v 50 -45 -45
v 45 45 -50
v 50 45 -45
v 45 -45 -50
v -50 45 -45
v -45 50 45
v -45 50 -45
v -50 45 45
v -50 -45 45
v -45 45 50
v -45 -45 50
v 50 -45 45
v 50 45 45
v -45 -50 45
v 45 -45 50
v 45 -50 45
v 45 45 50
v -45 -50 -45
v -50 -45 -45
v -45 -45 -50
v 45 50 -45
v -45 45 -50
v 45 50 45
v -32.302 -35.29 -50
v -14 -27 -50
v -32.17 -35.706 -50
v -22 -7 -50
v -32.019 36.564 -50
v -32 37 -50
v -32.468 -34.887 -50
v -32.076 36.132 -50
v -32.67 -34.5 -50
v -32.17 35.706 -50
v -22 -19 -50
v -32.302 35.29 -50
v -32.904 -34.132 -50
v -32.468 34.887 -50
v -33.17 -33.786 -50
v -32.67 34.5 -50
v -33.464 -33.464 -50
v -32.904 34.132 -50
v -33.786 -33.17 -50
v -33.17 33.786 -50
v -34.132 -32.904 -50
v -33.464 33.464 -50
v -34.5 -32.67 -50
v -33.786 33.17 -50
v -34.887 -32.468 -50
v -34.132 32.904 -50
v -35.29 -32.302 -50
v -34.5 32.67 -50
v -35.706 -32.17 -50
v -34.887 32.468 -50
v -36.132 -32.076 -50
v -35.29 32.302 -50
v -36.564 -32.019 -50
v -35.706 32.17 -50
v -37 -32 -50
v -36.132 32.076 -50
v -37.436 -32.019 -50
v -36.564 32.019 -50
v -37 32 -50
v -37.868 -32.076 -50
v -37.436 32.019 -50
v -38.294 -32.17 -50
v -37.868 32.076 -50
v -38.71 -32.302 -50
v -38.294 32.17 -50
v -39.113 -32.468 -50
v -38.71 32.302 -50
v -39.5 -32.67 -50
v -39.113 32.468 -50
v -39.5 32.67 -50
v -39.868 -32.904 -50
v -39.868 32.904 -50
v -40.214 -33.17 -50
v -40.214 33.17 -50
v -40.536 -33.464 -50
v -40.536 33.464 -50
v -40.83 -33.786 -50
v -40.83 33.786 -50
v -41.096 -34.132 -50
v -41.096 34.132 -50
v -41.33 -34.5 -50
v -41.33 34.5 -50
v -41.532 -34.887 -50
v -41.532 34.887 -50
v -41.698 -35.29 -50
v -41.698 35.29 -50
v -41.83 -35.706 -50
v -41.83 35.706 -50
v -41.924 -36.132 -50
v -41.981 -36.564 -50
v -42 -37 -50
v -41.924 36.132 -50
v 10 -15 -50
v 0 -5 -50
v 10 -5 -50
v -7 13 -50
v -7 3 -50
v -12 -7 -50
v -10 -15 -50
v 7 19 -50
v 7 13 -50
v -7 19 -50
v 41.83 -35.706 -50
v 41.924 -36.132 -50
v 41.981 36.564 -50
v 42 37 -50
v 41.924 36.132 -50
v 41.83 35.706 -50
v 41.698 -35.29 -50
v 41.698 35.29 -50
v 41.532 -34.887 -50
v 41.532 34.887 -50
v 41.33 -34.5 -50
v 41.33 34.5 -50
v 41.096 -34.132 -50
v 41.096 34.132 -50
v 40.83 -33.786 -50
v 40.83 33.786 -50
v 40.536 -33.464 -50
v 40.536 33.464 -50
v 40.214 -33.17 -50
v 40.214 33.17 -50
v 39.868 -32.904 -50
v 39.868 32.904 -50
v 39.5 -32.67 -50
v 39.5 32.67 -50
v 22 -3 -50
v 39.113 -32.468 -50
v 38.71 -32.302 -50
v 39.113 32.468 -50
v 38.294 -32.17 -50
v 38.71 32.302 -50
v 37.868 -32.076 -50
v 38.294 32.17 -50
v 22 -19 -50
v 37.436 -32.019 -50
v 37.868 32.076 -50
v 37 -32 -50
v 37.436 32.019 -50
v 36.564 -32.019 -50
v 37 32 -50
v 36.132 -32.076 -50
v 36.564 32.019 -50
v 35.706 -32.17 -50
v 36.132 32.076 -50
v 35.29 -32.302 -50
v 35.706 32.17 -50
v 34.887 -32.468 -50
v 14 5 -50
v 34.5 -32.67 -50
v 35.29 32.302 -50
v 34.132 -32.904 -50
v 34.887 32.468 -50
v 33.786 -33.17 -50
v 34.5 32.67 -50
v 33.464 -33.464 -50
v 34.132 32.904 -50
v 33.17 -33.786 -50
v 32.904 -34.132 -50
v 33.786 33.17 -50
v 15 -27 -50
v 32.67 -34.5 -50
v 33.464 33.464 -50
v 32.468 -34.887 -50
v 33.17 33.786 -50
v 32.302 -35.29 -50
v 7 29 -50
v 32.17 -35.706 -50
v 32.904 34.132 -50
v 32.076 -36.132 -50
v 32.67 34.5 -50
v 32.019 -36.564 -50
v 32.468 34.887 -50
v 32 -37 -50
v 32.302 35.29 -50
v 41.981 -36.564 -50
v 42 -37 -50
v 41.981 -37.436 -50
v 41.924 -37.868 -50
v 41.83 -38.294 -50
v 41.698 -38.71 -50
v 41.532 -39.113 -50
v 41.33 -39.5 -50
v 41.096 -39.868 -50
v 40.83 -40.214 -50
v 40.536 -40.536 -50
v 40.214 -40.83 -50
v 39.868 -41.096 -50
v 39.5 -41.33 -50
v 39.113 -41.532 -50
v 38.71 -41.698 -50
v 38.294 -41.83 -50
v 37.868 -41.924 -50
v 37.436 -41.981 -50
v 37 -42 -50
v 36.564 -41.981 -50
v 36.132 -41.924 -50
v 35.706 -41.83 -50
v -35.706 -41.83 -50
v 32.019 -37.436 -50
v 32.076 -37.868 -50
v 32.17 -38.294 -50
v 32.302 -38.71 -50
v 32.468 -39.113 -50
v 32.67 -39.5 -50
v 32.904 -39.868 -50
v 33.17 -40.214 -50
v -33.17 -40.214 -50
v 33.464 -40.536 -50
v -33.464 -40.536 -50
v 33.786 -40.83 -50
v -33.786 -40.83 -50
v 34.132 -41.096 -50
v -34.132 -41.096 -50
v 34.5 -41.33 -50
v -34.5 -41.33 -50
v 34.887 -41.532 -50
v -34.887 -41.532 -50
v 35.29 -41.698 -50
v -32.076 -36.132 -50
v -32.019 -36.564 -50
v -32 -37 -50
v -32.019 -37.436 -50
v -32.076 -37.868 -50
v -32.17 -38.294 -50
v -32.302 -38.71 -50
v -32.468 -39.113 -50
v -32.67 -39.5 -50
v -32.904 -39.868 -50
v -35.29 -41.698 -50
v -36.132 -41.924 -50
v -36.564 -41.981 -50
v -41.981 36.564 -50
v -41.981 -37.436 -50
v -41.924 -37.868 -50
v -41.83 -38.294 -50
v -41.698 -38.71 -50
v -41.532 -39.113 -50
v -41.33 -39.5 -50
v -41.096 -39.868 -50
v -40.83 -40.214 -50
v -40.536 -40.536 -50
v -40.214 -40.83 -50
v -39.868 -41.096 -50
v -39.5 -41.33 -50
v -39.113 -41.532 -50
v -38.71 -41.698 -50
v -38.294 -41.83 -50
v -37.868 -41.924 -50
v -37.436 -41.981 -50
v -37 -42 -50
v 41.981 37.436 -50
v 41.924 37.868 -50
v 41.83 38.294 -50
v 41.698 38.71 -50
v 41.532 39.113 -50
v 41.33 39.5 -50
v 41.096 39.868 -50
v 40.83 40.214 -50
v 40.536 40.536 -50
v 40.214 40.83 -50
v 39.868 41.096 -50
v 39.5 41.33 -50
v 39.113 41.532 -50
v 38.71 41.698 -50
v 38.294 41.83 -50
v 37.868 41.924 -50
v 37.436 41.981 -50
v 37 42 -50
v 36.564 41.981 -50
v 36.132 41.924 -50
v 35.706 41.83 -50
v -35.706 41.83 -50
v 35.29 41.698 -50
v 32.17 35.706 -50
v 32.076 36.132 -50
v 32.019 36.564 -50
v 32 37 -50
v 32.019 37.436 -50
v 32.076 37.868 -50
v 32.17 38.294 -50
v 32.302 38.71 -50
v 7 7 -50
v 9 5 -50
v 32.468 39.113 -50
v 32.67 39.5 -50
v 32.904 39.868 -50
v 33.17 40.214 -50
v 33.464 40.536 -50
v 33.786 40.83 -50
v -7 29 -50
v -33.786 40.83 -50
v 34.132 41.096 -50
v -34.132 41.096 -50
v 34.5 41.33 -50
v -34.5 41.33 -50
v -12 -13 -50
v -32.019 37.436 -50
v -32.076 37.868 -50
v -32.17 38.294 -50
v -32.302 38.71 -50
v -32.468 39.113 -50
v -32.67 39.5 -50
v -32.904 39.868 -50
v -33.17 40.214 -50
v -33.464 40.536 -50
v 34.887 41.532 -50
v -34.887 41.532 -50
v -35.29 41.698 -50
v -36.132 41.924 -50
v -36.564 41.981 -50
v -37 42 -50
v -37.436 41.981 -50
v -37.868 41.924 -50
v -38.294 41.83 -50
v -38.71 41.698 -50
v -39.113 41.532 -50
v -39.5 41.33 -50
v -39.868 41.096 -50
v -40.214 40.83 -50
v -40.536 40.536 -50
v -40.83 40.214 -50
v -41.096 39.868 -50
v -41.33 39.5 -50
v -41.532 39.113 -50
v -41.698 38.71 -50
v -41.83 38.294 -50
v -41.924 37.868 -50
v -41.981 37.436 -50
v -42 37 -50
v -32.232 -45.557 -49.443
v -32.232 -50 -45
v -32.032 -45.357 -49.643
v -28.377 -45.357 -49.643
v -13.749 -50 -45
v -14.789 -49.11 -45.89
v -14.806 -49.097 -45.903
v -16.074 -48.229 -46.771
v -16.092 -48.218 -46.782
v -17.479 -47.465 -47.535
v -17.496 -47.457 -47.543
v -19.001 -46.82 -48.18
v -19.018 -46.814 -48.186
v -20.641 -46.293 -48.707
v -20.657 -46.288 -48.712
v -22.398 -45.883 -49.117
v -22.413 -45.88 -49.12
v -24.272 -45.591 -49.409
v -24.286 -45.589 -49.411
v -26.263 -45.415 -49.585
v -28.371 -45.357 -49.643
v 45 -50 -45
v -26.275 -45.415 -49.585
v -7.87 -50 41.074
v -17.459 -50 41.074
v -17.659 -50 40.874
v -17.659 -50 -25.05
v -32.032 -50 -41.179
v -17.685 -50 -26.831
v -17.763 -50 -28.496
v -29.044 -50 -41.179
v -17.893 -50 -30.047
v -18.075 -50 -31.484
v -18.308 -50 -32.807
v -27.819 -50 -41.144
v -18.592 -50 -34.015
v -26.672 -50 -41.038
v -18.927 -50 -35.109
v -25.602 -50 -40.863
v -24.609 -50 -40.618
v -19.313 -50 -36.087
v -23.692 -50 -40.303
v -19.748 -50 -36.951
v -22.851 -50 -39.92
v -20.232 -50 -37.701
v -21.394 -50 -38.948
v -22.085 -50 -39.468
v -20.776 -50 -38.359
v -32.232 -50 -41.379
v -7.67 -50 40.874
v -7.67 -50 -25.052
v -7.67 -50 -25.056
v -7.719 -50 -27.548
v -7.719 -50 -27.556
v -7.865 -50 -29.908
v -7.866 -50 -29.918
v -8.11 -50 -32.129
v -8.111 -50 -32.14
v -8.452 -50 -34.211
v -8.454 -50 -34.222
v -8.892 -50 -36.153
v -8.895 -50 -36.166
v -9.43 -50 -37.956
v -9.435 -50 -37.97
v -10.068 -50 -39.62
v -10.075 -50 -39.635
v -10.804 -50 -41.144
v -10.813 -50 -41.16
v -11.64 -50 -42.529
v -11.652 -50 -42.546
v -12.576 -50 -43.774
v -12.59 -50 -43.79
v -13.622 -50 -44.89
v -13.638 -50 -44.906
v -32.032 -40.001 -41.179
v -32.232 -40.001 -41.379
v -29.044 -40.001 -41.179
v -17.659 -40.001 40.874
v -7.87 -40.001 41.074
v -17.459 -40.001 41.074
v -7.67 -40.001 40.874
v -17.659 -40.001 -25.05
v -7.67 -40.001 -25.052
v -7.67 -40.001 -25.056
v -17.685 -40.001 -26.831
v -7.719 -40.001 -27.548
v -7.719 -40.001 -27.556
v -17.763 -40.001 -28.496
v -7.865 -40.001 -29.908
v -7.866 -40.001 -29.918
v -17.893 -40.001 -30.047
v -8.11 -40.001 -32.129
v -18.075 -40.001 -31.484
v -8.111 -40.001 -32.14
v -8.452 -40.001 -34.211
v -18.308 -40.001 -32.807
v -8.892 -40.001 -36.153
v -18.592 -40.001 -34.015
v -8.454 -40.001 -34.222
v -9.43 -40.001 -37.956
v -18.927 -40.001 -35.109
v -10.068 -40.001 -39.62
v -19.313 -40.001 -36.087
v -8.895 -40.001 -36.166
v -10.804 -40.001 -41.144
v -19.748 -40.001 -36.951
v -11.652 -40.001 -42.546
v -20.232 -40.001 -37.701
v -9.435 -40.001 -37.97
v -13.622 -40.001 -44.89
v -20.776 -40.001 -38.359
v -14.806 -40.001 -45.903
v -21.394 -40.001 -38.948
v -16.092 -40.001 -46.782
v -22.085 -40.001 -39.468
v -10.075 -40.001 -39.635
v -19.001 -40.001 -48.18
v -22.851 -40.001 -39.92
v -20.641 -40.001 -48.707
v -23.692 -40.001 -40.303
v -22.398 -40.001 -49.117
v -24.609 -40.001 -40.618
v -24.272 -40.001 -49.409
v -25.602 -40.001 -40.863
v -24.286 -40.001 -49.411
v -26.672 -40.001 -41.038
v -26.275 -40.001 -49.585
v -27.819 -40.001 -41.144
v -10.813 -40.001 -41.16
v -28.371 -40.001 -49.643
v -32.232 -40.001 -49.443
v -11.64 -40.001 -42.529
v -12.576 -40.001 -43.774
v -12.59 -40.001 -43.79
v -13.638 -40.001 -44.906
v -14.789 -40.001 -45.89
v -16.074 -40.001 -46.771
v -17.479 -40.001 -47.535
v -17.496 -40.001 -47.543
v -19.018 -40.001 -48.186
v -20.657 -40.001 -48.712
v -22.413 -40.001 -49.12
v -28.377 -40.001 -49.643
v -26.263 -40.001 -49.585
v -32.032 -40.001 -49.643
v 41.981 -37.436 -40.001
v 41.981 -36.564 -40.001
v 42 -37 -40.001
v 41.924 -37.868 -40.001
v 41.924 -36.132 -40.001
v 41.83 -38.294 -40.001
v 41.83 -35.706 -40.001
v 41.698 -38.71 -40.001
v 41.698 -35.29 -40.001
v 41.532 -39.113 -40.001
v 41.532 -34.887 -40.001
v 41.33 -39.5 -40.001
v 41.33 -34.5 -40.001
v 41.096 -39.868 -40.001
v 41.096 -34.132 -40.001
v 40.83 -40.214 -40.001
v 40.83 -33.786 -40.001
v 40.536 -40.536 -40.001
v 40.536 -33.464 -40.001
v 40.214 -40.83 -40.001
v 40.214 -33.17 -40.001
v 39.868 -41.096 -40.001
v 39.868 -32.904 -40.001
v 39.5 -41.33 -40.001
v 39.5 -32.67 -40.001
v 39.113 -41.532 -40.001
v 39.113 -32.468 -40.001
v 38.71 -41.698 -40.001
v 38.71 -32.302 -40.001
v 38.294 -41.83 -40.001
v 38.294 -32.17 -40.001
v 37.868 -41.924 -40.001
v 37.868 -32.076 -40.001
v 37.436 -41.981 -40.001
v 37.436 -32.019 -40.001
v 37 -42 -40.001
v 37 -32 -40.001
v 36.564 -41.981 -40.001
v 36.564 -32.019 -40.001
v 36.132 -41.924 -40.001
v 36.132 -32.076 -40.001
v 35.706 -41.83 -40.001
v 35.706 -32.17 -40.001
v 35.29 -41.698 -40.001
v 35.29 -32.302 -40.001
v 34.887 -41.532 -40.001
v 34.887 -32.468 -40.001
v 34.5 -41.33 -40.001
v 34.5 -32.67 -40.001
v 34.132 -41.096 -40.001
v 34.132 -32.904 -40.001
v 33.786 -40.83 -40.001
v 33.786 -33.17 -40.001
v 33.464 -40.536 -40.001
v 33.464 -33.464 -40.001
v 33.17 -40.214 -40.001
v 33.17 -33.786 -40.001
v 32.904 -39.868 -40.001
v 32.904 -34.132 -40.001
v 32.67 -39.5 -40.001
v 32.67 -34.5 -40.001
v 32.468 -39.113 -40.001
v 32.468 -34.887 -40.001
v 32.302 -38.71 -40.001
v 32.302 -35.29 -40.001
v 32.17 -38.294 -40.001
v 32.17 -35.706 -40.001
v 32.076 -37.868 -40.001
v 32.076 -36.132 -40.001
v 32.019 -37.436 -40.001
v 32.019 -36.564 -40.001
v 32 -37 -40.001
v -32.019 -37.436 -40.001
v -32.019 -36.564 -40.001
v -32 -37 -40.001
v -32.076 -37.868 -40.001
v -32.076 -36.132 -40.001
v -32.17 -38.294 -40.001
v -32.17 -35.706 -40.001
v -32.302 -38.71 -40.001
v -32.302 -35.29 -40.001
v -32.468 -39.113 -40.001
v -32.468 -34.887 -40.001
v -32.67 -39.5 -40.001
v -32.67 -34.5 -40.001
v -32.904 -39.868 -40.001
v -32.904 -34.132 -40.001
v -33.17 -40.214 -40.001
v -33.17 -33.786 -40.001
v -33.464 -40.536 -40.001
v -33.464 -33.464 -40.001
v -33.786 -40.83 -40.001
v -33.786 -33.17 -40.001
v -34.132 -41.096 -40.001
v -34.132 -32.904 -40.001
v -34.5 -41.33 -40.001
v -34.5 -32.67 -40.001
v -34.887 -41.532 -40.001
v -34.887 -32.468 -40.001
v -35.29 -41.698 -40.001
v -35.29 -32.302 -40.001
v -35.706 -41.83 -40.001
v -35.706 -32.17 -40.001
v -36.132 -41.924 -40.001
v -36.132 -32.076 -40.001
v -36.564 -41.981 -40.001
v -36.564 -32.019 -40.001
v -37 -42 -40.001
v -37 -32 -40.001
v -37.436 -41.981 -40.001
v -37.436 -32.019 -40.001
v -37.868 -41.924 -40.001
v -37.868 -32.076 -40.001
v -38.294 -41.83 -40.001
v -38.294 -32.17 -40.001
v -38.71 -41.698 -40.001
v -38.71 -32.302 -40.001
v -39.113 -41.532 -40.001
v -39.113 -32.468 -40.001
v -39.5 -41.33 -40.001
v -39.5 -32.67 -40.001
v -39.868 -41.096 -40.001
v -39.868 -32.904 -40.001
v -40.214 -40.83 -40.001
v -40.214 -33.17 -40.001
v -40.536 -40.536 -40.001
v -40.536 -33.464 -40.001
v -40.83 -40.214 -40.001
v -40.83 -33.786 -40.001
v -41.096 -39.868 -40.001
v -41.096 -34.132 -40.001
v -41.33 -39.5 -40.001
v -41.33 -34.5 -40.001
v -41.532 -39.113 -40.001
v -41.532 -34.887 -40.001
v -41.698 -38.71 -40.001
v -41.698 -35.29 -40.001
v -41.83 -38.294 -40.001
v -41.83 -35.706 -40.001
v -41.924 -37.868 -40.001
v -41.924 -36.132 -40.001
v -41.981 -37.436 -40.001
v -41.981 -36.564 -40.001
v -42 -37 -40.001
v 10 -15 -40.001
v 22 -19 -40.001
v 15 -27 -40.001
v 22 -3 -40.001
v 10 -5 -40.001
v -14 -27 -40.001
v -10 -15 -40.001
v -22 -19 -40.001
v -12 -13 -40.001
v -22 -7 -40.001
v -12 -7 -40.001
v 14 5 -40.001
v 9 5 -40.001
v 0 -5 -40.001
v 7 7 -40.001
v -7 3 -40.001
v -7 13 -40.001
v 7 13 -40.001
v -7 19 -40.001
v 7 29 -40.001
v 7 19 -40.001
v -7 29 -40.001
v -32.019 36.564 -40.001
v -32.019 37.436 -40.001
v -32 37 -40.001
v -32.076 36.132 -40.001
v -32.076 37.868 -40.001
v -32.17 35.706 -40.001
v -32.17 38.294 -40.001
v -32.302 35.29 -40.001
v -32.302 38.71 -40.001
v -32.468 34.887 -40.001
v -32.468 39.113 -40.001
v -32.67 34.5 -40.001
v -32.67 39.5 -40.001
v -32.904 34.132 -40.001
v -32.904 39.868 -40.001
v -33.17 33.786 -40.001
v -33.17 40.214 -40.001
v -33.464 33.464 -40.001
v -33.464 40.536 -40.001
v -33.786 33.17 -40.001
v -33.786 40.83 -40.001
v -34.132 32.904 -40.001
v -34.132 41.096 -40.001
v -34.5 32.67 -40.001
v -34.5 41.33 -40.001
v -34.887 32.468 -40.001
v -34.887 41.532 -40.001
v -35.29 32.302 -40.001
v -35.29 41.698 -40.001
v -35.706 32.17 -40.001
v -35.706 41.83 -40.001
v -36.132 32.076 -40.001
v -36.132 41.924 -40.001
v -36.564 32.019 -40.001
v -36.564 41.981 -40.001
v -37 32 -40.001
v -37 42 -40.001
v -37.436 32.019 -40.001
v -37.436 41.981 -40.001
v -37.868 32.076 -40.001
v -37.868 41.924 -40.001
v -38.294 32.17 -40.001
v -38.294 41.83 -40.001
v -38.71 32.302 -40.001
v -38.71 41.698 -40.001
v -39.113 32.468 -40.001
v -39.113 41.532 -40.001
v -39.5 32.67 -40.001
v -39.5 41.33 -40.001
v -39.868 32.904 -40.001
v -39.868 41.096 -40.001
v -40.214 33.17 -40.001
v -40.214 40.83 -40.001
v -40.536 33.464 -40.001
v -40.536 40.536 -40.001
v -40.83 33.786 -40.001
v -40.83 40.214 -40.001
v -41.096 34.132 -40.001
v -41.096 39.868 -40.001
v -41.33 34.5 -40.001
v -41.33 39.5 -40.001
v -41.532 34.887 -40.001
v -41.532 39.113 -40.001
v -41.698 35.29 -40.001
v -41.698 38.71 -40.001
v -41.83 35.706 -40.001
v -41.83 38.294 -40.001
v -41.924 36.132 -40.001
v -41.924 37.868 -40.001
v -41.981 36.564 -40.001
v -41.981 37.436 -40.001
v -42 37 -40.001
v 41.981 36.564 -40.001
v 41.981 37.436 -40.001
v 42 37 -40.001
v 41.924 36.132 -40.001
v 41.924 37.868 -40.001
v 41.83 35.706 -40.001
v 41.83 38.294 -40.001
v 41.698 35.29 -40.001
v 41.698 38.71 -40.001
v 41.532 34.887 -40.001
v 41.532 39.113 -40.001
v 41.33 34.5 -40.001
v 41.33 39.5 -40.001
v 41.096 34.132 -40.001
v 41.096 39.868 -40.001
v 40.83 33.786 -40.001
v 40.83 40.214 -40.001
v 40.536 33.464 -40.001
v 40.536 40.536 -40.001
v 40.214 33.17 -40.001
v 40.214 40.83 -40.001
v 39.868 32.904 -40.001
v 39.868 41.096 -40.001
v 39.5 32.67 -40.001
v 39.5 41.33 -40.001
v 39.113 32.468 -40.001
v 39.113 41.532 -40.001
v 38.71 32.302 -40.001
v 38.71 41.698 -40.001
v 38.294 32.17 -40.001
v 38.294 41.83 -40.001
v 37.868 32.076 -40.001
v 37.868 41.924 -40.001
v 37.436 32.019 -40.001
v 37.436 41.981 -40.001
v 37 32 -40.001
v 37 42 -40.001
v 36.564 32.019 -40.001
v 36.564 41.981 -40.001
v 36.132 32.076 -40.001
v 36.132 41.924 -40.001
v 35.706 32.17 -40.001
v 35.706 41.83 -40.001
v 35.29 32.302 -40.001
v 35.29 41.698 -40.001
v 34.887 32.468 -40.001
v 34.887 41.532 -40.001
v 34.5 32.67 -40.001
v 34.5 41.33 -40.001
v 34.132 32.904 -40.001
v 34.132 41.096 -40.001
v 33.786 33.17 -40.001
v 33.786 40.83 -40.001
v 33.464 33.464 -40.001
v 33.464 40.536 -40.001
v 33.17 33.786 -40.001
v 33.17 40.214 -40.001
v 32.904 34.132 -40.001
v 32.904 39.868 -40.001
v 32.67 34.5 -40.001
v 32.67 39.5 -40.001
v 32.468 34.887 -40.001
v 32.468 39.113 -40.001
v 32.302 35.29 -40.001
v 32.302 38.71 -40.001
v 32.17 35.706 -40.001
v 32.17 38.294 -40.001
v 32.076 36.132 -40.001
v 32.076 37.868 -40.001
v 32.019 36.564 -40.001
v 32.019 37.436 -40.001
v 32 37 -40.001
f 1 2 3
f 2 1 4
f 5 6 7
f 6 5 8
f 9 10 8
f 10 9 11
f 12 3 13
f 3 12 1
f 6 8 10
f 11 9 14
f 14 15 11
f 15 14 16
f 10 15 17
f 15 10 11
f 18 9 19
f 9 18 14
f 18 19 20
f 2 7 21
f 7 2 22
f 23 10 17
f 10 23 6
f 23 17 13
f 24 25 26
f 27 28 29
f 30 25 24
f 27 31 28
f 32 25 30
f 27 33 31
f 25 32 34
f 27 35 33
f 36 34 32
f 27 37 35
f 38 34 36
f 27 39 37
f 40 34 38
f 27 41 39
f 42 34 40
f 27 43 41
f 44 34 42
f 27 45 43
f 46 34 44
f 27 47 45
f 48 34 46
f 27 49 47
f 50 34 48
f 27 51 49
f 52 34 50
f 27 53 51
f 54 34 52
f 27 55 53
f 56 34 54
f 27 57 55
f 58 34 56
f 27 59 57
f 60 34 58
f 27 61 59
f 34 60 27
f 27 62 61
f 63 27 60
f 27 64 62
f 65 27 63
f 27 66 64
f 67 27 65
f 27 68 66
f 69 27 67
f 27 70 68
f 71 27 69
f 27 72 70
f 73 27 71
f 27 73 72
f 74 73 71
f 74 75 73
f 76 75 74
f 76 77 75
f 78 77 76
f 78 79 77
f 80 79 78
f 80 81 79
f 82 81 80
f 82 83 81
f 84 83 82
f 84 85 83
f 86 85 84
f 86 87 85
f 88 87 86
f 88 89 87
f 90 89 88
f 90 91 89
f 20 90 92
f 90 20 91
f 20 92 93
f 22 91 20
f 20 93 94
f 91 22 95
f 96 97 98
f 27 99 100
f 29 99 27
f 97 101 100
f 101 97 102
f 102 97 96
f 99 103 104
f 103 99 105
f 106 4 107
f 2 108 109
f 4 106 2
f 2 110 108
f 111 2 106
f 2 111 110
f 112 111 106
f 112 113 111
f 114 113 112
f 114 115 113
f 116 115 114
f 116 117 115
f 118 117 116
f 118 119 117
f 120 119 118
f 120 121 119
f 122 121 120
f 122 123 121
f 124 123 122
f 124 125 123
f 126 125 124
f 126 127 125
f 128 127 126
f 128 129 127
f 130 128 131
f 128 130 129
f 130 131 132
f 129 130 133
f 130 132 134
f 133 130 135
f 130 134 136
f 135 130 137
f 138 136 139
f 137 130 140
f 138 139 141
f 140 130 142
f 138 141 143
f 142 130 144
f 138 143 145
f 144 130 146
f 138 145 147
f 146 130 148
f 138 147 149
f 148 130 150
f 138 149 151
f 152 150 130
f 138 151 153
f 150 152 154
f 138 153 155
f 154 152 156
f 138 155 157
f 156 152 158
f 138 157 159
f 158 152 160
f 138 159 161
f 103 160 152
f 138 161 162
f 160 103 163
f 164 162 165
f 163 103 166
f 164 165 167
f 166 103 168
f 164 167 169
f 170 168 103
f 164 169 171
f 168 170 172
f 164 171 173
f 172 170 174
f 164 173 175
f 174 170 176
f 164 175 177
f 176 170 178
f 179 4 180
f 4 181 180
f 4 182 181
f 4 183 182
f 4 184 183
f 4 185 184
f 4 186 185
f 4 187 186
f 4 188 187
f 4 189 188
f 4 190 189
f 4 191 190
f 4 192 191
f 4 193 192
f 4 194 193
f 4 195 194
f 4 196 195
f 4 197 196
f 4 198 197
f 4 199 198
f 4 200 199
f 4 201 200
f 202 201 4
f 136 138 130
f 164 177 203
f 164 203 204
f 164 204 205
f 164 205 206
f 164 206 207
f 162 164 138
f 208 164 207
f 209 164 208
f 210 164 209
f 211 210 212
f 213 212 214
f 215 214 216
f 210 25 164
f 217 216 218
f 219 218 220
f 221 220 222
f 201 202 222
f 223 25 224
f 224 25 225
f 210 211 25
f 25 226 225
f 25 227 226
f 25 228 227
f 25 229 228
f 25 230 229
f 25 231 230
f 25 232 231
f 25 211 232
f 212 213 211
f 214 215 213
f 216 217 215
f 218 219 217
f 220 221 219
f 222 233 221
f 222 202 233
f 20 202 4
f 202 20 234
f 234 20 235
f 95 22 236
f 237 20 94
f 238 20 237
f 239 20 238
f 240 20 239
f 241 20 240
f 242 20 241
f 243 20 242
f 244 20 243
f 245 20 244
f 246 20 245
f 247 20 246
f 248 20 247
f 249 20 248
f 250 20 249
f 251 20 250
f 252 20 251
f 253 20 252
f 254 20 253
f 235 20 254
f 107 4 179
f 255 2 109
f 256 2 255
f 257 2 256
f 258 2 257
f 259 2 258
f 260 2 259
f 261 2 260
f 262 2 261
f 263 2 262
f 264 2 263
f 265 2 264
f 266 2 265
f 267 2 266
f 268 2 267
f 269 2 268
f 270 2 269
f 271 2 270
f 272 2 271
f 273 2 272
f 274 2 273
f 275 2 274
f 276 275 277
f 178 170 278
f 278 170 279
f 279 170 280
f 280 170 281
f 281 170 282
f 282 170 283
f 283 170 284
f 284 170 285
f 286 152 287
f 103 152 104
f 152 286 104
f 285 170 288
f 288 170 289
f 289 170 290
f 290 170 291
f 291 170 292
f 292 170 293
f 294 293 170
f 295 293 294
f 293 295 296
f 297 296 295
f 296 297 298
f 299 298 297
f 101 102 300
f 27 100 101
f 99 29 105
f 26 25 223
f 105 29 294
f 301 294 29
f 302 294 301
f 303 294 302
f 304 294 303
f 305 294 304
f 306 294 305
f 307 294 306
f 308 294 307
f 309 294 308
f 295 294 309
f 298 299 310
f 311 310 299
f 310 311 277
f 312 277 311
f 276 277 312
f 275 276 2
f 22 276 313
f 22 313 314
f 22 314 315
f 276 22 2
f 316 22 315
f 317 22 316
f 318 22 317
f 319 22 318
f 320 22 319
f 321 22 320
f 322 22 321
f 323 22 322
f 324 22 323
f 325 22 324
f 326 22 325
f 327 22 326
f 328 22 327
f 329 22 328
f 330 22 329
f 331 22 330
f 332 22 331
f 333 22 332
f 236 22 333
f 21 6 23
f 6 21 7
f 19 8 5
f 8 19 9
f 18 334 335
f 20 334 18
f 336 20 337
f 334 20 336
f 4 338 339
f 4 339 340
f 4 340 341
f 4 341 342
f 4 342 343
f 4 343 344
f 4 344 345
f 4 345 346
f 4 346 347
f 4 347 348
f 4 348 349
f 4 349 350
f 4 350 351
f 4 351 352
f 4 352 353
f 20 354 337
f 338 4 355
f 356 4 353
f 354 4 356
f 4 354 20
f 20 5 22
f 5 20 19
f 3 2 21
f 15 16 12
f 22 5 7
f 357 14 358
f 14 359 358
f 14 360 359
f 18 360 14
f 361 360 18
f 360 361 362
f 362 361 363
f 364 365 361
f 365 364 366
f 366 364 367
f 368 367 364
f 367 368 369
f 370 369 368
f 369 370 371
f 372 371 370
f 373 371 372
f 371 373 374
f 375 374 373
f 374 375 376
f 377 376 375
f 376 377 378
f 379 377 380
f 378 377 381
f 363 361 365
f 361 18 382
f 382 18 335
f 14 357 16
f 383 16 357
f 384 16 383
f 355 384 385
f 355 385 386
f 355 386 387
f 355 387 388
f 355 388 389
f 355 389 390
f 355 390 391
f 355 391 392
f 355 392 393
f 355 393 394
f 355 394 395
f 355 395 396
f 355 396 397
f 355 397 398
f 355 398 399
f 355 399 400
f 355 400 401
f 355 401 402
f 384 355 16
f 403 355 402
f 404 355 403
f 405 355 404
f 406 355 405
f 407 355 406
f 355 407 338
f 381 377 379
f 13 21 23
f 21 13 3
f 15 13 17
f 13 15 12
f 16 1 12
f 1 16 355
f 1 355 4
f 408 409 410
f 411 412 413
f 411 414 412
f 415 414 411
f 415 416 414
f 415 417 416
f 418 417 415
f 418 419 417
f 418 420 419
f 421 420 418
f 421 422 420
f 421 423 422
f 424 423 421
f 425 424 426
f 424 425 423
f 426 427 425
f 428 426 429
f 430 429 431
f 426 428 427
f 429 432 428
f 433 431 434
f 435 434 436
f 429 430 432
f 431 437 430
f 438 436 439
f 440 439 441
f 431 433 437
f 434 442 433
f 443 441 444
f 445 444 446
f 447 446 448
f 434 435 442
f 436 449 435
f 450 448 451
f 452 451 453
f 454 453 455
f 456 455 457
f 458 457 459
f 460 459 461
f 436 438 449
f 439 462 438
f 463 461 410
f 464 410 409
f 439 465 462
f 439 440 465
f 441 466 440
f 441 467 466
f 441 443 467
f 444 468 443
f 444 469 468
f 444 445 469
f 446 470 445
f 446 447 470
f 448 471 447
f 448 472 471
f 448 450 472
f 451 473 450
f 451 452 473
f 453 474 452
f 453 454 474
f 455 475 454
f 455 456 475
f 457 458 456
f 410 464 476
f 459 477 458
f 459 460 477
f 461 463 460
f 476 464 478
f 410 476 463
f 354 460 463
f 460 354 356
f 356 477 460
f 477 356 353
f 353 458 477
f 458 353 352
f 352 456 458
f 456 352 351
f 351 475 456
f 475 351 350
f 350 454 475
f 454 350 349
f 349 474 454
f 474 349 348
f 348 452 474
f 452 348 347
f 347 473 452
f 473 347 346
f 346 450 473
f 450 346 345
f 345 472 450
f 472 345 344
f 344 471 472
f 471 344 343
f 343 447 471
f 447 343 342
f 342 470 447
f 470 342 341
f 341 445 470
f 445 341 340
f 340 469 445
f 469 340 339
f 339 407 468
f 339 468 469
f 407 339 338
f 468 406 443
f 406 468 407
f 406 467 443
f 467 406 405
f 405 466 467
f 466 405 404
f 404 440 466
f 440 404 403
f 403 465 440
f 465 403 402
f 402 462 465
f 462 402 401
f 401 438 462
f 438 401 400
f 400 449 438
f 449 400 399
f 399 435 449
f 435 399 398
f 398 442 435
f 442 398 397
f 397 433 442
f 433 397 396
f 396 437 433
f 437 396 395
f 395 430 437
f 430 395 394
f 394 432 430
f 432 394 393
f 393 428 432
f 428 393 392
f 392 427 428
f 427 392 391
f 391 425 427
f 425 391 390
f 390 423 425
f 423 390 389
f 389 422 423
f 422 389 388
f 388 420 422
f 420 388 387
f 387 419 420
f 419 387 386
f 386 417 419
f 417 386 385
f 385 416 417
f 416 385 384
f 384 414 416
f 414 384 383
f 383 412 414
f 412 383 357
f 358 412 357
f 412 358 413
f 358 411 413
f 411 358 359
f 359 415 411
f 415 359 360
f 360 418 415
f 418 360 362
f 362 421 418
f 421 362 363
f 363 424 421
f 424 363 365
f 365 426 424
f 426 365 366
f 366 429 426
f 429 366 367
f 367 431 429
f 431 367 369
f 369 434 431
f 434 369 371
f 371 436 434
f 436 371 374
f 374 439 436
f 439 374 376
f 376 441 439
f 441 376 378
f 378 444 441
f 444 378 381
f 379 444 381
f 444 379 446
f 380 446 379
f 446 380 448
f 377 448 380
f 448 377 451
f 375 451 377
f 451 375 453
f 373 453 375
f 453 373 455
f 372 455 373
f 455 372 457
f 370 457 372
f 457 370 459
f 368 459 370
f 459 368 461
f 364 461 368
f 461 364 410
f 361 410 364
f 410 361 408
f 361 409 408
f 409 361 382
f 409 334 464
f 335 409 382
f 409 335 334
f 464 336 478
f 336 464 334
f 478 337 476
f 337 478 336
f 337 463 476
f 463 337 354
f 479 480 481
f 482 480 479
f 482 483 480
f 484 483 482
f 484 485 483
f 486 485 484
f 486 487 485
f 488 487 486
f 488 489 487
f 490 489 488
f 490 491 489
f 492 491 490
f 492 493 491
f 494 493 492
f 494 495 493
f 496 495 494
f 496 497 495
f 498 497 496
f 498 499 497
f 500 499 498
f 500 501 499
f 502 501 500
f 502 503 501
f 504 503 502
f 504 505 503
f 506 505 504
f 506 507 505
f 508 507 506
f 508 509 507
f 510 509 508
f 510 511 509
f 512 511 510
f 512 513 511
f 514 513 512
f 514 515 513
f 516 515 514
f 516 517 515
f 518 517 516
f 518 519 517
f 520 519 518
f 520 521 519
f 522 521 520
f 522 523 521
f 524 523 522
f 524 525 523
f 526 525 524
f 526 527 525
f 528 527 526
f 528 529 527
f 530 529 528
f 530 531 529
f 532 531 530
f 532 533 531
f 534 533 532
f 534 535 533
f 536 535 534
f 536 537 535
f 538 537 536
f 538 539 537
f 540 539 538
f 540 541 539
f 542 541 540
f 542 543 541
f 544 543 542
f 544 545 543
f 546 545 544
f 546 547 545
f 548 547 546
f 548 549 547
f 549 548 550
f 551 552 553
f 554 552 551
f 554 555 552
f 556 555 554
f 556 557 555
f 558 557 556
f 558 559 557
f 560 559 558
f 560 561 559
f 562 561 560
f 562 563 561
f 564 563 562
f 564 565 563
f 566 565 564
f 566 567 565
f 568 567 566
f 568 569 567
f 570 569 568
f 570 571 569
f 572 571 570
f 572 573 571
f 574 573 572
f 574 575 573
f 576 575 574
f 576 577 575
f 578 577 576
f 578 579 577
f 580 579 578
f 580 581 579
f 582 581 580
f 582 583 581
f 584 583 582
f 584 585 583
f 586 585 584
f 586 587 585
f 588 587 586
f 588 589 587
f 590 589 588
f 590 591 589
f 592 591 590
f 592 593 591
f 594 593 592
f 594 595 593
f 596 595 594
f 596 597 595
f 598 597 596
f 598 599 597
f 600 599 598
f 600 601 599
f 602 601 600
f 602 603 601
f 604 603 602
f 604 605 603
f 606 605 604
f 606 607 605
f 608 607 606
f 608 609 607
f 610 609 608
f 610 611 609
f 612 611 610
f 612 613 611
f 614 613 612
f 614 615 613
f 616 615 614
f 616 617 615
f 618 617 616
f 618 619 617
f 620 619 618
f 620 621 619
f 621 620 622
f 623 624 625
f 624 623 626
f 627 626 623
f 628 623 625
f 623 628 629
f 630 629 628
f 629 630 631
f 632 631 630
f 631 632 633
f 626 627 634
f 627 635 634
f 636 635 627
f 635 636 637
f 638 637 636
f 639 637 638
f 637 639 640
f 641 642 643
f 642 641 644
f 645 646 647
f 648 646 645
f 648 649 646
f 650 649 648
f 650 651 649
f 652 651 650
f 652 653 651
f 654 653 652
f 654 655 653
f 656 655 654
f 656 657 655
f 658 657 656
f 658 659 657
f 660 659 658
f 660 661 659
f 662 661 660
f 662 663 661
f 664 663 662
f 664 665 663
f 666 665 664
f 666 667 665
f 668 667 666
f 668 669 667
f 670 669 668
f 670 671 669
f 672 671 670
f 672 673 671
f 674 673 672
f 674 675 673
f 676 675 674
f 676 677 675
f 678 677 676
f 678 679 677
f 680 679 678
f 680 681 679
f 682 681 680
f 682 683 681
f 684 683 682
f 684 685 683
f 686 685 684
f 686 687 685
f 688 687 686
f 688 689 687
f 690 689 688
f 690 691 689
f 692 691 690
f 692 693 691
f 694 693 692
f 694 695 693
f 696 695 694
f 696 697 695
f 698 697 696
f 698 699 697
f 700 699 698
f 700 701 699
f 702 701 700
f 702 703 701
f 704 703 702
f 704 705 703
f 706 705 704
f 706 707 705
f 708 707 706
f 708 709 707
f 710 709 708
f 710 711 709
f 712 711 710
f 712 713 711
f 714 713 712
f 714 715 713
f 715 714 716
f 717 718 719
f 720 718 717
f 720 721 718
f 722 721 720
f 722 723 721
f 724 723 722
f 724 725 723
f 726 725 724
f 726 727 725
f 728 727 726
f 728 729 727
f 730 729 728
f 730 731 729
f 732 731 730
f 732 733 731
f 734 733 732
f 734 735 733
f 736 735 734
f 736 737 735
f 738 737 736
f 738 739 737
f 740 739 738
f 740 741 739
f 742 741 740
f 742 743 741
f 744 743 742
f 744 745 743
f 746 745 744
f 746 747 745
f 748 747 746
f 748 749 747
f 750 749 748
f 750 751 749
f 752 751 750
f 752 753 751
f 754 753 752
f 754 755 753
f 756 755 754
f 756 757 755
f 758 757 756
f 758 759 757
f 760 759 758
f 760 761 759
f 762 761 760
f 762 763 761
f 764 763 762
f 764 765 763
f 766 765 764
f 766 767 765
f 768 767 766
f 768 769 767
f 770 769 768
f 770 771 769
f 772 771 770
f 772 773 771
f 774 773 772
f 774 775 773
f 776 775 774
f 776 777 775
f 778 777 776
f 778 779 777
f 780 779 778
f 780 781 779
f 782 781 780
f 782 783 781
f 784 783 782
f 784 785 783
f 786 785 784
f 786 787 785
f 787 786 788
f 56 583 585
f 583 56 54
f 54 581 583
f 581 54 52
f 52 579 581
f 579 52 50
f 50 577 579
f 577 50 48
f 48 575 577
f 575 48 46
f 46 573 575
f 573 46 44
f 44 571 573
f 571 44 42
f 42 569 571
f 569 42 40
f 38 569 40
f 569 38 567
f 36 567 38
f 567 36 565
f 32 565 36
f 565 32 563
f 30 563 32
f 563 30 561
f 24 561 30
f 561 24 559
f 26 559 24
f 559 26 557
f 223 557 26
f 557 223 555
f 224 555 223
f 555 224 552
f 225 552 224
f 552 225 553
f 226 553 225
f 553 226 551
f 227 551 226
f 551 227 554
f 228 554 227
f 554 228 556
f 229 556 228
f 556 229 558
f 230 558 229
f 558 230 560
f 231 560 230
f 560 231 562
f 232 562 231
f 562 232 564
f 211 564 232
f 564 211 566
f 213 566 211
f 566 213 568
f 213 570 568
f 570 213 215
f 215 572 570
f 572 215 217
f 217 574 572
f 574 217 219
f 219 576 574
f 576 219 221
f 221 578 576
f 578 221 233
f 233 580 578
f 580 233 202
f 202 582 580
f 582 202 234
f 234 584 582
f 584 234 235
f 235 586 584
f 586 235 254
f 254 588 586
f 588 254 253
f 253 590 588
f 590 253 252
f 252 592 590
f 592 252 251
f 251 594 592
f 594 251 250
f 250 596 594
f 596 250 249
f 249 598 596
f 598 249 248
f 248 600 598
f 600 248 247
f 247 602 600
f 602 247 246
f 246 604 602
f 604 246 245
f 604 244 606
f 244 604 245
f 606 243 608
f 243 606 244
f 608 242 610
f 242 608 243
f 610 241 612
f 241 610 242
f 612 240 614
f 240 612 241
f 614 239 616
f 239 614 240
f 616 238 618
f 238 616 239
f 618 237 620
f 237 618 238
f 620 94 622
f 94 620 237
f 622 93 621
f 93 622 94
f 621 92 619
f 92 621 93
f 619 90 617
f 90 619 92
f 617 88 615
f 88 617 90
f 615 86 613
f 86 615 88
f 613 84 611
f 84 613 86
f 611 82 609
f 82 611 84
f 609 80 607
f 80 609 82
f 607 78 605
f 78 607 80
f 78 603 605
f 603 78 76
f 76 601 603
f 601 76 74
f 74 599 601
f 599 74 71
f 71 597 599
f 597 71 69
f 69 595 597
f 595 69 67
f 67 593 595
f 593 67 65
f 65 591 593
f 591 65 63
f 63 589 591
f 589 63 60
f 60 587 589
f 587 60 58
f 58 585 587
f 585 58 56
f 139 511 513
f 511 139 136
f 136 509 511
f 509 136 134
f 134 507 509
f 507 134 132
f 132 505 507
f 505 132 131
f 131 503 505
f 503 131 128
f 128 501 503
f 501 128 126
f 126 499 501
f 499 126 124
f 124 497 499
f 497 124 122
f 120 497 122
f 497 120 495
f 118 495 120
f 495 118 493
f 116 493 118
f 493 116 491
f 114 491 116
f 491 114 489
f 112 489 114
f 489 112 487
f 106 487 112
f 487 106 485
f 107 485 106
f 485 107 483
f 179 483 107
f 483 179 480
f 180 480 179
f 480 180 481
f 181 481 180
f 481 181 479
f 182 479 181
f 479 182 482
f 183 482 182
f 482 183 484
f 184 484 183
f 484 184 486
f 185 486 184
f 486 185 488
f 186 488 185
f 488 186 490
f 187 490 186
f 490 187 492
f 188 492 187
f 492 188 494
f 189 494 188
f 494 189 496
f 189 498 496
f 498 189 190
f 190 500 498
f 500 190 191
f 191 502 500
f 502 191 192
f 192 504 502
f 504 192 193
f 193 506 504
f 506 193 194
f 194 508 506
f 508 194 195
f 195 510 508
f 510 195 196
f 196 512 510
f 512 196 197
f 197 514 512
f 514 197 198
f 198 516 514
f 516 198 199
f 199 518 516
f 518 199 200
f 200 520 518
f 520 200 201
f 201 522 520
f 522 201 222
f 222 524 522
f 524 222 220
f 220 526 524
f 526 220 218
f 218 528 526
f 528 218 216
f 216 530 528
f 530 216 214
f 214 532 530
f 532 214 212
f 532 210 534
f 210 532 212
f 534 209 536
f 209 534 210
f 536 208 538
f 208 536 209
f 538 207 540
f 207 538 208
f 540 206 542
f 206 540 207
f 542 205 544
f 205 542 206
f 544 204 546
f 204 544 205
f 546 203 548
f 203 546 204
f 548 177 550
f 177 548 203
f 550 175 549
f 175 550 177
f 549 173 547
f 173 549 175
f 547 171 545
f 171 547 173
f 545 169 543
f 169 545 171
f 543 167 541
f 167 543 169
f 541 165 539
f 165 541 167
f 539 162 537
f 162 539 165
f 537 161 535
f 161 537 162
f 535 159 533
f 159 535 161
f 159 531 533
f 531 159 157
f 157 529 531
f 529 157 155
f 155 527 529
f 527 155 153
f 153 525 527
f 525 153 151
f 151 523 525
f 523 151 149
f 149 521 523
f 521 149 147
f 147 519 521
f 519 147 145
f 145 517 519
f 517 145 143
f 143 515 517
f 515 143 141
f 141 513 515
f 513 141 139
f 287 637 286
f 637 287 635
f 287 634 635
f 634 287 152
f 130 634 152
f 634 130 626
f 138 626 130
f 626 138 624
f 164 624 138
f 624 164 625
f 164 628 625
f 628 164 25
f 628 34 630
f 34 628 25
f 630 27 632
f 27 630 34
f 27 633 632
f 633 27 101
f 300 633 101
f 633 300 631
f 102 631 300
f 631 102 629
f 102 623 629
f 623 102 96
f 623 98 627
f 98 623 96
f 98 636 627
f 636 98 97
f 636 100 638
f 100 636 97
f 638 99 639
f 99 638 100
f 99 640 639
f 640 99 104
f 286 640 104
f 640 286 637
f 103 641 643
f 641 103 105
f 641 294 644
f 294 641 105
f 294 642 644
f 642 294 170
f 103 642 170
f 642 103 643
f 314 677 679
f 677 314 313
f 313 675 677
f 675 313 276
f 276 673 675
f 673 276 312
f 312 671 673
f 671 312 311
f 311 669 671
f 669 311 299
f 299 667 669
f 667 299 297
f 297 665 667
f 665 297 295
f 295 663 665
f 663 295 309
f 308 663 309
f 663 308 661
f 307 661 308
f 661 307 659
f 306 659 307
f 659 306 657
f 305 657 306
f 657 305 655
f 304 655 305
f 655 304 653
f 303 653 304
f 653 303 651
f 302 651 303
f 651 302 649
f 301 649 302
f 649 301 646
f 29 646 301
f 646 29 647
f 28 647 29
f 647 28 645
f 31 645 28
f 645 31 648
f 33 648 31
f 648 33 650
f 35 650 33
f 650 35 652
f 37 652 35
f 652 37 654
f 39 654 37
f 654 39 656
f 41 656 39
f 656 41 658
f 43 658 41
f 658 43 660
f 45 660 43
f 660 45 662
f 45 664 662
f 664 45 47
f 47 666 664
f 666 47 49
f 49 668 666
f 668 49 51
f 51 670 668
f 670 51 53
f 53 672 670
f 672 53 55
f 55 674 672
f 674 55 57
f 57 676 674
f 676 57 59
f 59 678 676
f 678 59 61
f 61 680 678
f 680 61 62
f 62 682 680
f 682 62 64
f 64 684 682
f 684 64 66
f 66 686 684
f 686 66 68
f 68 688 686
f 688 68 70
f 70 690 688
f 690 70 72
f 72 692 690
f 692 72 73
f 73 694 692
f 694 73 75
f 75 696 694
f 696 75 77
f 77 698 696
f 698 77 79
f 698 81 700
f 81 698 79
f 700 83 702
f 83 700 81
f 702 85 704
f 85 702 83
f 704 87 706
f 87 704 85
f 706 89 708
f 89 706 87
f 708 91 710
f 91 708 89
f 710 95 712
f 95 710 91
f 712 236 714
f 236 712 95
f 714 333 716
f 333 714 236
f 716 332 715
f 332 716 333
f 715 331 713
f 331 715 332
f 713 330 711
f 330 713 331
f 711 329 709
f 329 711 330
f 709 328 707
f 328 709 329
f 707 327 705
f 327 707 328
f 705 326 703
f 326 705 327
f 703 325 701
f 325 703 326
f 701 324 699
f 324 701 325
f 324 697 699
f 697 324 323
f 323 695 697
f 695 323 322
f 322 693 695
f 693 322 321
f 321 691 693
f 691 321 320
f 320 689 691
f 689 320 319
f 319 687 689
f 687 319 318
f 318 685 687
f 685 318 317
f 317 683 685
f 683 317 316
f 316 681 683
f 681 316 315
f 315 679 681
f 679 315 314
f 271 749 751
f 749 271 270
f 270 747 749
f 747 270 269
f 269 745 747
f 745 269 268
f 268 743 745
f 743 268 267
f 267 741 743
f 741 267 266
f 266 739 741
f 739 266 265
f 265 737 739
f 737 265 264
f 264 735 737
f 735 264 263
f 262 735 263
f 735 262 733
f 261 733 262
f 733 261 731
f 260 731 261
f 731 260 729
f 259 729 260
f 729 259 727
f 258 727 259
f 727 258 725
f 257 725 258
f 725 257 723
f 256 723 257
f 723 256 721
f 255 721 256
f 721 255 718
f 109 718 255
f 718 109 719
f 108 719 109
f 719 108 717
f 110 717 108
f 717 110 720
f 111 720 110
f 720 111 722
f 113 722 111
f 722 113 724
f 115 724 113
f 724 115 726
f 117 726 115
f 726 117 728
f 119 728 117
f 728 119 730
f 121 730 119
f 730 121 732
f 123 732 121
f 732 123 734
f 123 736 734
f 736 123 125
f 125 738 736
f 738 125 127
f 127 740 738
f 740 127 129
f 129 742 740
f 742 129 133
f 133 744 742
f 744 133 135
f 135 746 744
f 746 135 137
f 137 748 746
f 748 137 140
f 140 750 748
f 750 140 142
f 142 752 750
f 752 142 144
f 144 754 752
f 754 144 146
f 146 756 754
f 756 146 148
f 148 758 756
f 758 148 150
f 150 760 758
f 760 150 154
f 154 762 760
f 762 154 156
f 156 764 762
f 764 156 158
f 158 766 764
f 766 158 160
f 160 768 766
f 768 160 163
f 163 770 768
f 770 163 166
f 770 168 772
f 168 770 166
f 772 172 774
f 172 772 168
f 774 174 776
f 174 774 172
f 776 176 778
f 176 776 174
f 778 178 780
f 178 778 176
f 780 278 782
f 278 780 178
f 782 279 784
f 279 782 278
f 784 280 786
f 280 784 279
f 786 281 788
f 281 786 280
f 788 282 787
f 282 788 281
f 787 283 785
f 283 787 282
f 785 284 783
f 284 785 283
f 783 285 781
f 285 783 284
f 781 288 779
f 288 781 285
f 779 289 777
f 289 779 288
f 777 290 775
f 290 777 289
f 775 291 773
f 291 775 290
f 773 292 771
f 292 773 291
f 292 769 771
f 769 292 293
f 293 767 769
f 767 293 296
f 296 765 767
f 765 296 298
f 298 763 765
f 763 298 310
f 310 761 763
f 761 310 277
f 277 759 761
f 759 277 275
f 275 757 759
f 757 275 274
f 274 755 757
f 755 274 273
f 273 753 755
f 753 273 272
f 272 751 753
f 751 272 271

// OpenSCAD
// file: common.scad
// Unless otherwise specified, each resulting shape is
// resting on the XY plane, centered on the Z axis.

// A small amount to make sure shapes overlap when needed. This
// is well below the resolution of my 3D printer, so it
// shouldn't affect the final result.
eps = 0.001;

// High quality for printing.
$fa = 5;
$fs = 0.4;

module repeatx(n, spacing) {
  for (i = [1:n])
    translate([(i-1)*spacing, 0, 0])
      children();
}

module repeaty(n, spacing) {
  for (i = [1:n])
    translate([0, (i-1)*spacing, 0])
      children();
}

// A square pyramid, 1mm wide and 0.5mm tall. Each side of
// the base is centered on an axis.
module pyramid() {
  linear_extrude(0.5, scale=0)
    square(1, center=true);
}

// A regular octahedron centered on the origin with its
// vertices on the axes. 'axis' gives its full length along
// each axis.
module octahedron(axis) {
  // Top and bottom halves.
  for (a = [-1, 1])
    scale([1, 1, a])
      // Extrude a square into a pyramid.
      linear_extrude(axis/2, scale=0)
        rotate([0, 0, 45])
          square(norm([axis/2, axis/2]), center=true);
}

// 'd' is the outer dimensions of the box.
module chamfered_box(d, chamfer=0.5) {
  assert(d.x >= chamfer*2);
  assert(d.y >= chamfer*2);
  assert(d.z >= chamfer*2);

  // Raise the result up so it is resting on the XY plane.
  translate([0, 0, d.z/2]) {
    minkowski() {
      // The desired cube, scaled back by the chamfer distance
      // in all directions.
      cube(d - [chamfer*2, chamfer*2, chamfer*2], center=true);
      octahedron(chamfer*2);
    }
  }
}

module chamfered_disk(height, radius) {
  // Chamfer base disks and chips more aggressively.
  chamfer = 1.1;
  assert(radius >= chamfer);
  assert(height >= chamfer*2);

  // Raise the result up so it is resting on the XY plane.
  translate([0, 0, height/2]) {
    minkowski() {
      // The desired disk, scaled back by the chamfer distance
      // in all directions.
      cylinder(height-chamfer*2, r=radius-chamfer, center=true);
      
      // A pair of cones.
      for (a = [-1, 1])
        scale([1, 1, a])
          linear_extrude(chamfer, scale=0)
            circle(chamfer);
    }
  }
}

locking_lug_dims = [2.3, 2.3, 1.8+2*eps];

// A snug fit for gluing.
module locking_lug() {
  // Taper the lug slightly, to counteract the printing effect
  // which spreads the top layer slightly.
  linear_extrude(locking_lug_dims.z, scale=0.95)
    square([locking_lug_dims.x, locking_lug_dims.y],
            center=true);
}

// Make extra sure the lug will fit all the way into the hole.
locking_socket_extra_depth = 0.7;

module locking_socket_top() {
  extra_depth = 0.15;
  translate([
    0, 0,
    -(
       locking_lug_dims.z+locking_socket_extra_depth+extra_depth
    )/2+eps
  ]) {
    cube(locking_lug_dims + [
      0.15, 0.15,
      locking_socket_extra_depth+extra_depth
    ], center=true);
  }
}

module locking_socket_bottom() {
  translate([
    0, 0,
    (locking_lug_dims.z+locking_socket_extra_depth)/2-eps
  ]) {
    cube(locking_lug_dims + [
      // When printing this on the bottom of a model, it
      // needs to be a bit wider to account for
      // elephant-foot.
      0.3, 0.3,
      locking_socket_extra_depth
    ], center=true);
  }
}

// A pin which can be used to join two locking sockets.
module locking_pin() {
  dims = [
    locking_lug_dims.x-0.2,
    // Lay the pin on its side for more reliable printing.
    locking_lug_dims.z*2 + locking_socket_extra_depth/2,
    locking_lug_dims.y-0.2,
  ];
  translate([0, 0, dims.z/2]) {
    difference() {
      cube(dims, center=true);
      
      // A slight bottom chamfer to combat elephant-foot.
      for (a = [-1, 1])
        scale([a, 1, 1])
          translate([dims.x/2, -eps, -dims.z/2-1.3])
            rotate([0, 45, 0])
              cube([dims.x, dims.y+3*eps, dims.z], center=true);
    }
  }
}

// Arranges children in square pattern.
module arrange(spacing) {
  s = ceil(sqrt($children));
  for (a = [0:s-1], b = [0:s-1]) {
    c = a + b*s;
    x = a - s/2 + 0.5;
    y = b - s/2 + 0.5;
    if (c < $children)
      translate([x*spacing, y*spacing, 0])
        children(c);
  }
}
// main file
include <common.scad>

side = 100;
engrave = 10;
engrave_offset = side/2-engrave+0.001;

difference() {
  translate([0, 0, -side/2])
    chamfered_box([side, side, side], chamfer=5);
  
  rotate([90, 0, 0]) 
    translate([-27, -30, engrave_offset])
      linear_extrude(engrave)
        offset(0.2)
          text("J", 70, "Bookman");

  // Question mark.
  rotate([180, 0, 0]) {
    translate([0, 0, engrave_offset]) {
      linear_extrude(engrave) {
        translate([0, -3, 0]) {
          polygon([
            [-7, -10],
            [-7, 0],
            [0, 8],
            [10, 8],
            [10, 18],
            [-10, 18],
            [-12, 16],
            [-12, 10],
            [-22, 10],
            [-22, 22],
            [-14, 30],
            [15, 30],
            [22, 22],
            [22, 6],
            [14, -2],
            [9, -2],
            [7, -4],
            [7, -10],
          ]);
          polygon([
            [-7, -26],
            [-7, -16],
            [7, -16],
            [7, -26],
          ]);
        }
    
        // Studs around question mark.
        for (a = [-1, 1], b = [-1, 1])
          scale([a, b, 1])
            translate([37, 37, 0])
              circle(5);
      }
    }
  }
}
